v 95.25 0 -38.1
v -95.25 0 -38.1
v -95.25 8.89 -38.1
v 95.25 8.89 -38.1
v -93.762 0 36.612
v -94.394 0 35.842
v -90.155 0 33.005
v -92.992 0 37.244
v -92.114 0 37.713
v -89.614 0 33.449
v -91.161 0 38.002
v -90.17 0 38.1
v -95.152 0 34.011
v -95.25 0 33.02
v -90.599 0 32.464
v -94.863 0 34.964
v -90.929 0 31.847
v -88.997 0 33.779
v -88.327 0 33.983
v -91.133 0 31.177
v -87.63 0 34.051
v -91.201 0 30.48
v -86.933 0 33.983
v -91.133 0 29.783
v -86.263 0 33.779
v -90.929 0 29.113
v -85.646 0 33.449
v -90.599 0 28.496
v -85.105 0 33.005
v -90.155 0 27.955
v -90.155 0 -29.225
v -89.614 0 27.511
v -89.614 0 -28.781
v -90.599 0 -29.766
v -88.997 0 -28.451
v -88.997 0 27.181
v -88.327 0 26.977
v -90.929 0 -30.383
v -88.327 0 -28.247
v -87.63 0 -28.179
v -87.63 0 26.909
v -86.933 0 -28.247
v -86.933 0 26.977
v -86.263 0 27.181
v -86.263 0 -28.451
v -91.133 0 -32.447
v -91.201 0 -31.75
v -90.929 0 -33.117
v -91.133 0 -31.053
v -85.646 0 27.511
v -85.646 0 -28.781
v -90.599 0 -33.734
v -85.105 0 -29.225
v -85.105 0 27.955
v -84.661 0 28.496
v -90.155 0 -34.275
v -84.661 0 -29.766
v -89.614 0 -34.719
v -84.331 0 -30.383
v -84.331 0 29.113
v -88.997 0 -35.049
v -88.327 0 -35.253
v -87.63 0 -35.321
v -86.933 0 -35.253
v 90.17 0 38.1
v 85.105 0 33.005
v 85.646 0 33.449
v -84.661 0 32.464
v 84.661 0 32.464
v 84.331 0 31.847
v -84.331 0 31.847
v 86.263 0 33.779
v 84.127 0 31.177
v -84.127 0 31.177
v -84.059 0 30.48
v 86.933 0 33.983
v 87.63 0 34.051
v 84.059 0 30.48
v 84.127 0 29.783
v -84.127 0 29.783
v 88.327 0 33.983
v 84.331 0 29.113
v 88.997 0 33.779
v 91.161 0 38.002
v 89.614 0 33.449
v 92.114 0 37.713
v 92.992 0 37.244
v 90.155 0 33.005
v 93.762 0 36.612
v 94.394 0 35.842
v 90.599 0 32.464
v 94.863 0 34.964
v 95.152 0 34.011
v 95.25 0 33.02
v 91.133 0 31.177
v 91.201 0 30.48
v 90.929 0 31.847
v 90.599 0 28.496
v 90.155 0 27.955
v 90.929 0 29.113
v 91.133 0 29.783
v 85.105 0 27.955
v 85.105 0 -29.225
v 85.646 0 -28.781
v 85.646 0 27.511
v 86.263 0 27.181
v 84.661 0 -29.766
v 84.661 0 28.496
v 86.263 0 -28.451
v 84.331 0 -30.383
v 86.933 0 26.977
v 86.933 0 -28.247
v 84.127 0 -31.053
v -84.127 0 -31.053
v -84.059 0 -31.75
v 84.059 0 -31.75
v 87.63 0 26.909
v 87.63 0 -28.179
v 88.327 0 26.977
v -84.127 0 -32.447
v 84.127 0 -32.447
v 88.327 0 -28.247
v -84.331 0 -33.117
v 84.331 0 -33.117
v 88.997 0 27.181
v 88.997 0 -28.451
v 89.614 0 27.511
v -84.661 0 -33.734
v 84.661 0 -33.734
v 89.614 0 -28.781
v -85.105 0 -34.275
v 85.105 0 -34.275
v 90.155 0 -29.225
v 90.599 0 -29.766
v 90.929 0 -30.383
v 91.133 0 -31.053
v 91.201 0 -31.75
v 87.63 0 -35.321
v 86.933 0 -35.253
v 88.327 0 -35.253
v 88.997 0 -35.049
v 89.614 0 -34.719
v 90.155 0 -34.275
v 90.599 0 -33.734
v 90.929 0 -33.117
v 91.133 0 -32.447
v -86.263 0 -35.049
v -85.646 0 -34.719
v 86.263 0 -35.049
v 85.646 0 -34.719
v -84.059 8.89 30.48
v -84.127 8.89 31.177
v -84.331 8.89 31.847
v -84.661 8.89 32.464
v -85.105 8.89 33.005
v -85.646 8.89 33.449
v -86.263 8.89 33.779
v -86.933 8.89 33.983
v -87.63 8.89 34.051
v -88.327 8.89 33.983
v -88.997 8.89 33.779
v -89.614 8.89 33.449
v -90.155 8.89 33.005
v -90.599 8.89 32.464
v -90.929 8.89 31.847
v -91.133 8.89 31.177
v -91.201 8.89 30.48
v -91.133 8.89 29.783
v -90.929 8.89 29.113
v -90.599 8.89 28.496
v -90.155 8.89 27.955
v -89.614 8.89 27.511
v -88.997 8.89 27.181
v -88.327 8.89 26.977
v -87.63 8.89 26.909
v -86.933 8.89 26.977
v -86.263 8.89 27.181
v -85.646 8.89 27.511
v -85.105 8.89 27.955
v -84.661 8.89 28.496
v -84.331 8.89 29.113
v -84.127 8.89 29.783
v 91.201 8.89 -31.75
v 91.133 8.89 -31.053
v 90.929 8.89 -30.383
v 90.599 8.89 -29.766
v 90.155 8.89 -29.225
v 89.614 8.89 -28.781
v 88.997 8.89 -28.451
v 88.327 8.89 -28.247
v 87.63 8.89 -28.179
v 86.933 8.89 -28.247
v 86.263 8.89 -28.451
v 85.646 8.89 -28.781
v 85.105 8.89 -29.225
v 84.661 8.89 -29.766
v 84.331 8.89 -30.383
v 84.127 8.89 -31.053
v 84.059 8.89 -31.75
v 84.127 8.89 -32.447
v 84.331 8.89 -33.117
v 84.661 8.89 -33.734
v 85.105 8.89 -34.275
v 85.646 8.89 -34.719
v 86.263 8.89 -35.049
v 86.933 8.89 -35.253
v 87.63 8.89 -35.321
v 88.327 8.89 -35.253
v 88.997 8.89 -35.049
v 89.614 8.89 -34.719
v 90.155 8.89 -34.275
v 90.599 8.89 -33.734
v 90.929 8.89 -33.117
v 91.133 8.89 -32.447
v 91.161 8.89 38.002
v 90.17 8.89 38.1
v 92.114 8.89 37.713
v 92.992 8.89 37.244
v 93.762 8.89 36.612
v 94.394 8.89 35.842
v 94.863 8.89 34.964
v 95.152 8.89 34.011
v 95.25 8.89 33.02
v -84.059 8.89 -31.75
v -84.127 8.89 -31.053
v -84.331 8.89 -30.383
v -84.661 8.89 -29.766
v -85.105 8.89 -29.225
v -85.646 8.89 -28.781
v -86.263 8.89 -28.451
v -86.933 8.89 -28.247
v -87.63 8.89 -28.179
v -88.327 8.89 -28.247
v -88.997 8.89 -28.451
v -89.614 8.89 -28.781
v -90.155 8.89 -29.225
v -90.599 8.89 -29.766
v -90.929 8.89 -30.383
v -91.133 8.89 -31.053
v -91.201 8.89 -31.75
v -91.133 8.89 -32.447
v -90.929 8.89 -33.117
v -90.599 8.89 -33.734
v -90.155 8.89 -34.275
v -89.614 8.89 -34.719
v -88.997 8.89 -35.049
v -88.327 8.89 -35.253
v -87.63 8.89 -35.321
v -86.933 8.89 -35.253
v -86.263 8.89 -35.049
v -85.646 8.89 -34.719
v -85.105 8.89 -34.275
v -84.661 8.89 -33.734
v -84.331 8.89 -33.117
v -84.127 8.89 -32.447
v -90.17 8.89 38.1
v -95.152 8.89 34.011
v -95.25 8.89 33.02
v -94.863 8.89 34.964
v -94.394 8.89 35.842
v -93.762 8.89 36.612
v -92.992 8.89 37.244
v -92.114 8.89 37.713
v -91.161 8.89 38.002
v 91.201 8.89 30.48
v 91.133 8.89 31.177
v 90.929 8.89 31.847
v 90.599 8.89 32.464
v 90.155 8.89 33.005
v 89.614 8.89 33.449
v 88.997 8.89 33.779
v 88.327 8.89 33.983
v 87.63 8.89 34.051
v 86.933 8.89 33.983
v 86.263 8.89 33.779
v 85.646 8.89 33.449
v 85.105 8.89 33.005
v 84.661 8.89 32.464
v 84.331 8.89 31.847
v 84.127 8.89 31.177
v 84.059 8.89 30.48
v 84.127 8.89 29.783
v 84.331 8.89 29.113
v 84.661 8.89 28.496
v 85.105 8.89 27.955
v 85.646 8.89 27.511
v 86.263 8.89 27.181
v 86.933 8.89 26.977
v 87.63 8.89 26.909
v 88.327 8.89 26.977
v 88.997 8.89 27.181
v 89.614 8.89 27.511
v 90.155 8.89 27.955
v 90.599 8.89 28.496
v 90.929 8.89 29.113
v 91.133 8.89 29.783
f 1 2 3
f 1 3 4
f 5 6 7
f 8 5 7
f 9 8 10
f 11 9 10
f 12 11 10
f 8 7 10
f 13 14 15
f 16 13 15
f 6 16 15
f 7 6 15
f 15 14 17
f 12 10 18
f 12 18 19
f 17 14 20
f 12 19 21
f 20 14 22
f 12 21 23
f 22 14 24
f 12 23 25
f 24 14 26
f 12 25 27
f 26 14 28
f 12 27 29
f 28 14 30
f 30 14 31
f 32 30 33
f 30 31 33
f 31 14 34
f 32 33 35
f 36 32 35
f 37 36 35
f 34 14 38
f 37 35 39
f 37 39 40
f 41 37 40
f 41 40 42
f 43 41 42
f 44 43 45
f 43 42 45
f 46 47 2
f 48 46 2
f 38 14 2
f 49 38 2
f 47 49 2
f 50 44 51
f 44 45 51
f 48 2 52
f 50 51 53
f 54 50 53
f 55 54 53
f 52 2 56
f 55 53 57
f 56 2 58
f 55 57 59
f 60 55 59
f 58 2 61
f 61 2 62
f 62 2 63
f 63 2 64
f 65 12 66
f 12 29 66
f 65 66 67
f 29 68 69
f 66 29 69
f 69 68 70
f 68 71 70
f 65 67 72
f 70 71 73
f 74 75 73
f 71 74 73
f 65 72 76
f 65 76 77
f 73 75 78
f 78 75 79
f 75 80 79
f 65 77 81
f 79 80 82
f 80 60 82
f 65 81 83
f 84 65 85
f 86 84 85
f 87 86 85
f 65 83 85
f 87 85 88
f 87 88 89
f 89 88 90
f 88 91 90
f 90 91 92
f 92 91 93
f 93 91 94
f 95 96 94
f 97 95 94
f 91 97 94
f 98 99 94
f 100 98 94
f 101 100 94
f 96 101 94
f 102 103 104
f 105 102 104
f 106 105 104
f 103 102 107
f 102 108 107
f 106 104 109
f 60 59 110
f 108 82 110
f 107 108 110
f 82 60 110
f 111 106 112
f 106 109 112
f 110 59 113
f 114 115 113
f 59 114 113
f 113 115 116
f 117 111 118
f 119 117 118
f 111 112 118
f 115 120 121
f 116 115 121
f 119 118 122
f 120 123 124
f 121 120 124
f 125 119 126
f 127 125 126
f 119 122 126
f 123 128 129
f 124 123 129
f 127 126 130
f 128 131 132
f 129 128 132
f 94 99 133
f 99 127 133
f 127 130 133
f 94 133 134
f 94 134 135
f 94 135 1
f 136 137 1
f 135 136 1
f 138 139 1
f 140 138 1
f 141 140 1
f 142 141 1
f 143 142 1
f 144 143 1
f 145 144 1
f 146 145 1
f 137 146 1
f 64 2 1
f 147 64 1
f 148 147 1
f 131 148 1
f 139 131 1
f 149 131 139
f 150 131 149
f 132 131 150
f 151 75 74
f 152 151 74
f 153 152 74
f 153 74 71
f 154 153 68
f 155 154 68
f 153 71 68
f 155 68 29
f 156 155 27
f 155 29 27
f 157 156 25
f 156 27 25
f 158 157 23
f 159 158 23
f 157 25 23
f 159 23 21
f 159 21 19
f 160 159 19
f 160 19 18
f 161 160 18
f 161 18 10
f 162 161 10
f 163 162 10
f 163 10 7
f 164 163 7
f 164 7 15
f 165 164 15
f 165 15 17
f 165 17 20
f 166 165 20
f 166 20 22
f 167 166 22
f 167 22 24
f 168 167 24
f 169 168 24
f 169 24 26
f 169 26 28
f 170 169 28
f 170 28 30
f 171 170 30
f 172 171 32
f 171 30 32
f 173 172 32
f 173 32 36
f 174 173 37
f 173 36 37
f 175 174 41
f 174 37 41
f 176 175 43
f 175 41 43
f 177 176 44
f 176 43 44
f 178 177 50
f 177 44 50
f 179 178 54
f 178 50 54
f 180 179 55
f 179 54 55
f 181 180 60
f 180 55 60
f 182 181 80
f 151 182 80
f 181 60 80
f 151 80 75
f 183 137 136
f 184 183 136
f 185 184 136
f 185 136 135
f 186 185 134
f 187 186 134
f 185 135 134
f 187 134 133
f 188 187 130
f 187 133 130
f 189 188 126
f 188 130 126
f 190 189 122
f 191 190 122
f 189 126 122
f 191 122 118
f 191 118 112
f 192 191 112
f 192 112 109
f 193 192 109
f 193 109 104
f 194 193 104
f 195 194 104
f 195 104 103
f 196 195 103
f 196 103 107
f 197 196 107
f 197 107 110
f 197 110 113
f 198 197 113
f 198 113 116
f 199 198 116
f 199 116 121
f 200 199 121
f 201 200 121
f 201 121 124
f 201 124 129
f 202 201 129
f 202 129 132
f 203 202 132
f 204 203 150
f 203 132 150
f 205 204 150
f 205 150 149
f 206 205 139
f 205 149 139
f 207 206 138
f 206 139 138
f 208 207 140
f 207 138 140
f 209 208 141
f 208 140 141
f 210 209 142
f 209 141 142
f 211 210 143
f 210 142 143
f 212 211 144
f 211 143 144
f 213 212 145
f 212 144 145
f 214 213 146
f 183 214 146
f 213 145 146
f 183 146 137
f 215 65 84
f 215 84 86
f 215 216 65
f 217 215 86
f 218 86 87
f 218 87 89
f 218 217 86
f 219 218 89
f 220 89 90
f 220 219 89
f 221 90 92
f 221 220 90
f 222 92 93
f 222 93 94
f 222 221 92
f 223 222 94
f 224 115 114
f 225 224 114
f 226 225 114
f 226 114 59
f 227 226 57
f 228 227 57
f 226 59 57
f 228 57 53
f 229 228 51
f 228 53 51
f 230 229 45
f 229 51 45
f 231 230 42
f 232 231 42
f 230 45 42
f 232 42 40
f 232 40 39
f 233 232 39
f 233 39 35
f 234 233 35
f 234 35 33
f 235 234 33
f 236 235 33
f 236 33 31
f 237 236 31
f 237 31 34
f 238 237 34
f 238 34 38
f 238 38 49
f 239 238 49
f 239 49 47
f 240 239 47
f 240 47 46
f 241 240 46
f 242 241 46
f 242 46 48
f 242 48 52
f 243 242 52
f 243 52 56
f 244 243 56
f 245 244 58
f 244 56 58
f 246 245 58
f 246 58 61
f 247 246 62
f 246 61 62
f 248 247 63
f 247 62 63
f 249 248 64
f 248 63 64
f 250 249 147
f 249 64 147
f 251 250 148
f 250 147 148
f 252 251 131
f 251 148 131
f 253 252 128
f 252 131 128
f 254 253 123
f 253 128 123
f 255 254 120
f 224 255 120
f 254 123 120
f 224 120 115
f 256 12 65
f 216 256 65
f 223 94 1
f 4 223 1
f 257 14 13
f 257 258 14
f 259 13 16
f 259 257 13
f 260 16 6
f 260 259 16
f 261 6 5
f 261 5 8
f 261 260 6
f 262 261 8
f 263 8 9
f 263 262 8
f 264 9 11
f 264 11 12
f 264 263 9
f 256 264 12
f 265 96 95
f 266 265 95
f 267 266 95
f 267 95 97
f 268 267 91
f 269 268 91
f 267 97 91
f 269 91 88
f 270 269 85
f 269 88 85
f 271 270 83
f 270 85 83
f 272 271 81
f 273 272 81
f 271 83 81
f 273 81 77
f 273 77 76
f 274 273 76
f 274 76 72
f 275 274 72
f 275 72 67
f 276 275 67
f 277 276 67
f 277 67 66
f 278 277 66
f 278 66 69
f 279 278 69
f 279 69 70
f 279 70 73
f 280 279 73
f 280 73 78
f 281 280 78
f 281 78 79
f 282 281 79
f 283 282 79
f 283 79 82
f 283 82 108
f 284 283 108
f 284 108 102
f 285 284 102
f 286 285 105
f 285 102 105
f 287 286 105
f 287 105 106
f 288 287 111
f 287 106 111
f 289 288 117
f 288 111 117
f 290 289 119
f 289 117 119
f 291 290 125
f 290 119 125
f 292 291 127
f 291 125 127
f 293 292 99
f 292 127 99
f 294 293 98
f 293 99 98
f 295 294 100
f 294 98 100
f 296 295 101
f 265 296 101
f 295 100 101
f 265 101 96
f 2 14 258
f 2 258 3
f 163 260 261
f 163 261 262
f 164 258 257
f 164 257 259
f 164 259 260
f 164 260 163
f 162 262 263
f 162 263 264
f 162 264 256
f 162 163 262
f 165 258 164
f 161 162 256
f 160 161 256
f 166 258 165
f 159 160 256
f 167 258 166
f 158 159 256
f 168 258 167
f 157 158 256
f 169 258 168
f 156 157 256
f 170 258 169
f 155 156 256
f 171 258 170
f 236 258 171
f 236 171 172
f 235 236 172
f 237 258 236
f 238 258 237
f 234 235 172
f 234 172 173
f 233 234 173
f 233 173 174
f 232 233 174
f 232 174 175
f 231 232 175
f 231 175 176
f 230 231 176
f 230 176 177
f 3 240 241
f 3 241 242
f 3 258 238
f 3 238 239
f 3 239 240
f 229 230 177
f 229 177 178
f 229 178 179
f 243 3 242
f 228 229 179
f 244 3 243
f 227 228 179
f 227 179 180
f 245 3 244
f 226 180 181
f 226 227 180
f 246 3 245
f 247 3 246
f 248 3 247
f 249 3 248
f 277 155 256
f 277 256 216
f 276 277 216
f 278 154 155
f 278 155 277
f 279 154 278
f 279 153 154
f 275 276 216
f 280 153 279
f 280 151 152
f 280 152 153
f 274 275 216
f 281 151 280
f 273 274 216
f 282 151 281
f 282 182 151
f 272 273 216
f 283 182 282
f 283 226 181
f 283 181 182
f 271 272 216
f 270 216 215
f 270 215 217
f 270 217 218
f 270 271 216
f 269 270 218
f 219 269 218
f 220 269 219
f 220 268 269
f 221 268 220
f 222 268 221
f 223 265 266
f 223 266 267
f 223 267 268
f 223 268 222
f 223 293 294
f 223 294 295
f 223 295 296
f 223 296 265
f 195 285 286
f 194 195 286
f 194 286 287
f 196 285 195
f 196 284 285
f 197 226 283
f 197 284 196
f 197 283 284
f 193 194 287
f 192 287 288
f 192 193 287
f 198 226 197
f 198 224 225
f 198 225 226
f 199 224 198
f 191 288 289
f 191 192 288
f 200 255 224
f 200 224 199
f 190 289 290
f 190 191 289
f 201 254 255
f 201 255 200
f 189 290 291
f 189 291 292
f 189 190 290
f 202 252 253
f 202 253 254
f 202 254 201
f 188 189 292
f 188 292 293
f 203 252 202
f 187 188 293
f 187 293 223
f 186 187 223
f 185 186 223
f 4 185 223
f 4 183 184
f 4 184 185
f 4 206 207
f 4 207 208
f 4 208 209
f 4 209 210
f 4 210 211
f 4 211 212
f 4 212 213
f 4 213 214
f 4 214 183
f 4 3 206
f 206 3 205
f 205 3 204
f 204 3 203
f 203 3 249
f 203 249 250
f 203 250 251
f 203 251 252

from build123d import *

# Parameters (mm, degrees)
SKETCH1_W                   = 190.5
SKETCH1_H                   = 76.2
BOSS_EXTRUDE1_DEPTH         = 8.89
F_1_4_CLEARANCE_HOLE1_D     = 7.14248
F_1_4_CLEARANCE_HOLE1_DEPTH = 8.89
FILLET1_R                   = 5.08


with BuildPart() as part:
    # Sketch1 → Boss-Extrude1 (new body)
    with BuildSketch(Plane(origin=(0, 0, 0), x_dir=(1, 0, 0), z_dir=(0, 1, 0))):
        Rectangle(SKETCH1_W, SKETCH1_H)
    extrude(amount=BOSS_EXTRUDE1_DEPTH)

    # 1/4 Clearance Hole1
    with Locations(Plane(origin=(0, 8.89, 0), x_dir=(-1, 0, 0), z_dir=(0, 1, 0))):
        with Locations((87.63, -31.75), (-87.63, -31.75), (-87.63, 30.48), (87.63, 30.48)):
            Hole(F_1_4_CLEARANCE_HOLE1_D / 2, depth=F_1_4_CLEARANCE_HOLE1_DEPTH)

    # Fillet1
    fillet1_edges = [part.edges().sort_by_distance(p)[0] for p in [
        (95.25, 4.445, 38.1),
        (-95.25, 4.445, 38.1),
    ]]
    fillet(fillet1_edges, radius=FILLET1_R)


solid = part.part
